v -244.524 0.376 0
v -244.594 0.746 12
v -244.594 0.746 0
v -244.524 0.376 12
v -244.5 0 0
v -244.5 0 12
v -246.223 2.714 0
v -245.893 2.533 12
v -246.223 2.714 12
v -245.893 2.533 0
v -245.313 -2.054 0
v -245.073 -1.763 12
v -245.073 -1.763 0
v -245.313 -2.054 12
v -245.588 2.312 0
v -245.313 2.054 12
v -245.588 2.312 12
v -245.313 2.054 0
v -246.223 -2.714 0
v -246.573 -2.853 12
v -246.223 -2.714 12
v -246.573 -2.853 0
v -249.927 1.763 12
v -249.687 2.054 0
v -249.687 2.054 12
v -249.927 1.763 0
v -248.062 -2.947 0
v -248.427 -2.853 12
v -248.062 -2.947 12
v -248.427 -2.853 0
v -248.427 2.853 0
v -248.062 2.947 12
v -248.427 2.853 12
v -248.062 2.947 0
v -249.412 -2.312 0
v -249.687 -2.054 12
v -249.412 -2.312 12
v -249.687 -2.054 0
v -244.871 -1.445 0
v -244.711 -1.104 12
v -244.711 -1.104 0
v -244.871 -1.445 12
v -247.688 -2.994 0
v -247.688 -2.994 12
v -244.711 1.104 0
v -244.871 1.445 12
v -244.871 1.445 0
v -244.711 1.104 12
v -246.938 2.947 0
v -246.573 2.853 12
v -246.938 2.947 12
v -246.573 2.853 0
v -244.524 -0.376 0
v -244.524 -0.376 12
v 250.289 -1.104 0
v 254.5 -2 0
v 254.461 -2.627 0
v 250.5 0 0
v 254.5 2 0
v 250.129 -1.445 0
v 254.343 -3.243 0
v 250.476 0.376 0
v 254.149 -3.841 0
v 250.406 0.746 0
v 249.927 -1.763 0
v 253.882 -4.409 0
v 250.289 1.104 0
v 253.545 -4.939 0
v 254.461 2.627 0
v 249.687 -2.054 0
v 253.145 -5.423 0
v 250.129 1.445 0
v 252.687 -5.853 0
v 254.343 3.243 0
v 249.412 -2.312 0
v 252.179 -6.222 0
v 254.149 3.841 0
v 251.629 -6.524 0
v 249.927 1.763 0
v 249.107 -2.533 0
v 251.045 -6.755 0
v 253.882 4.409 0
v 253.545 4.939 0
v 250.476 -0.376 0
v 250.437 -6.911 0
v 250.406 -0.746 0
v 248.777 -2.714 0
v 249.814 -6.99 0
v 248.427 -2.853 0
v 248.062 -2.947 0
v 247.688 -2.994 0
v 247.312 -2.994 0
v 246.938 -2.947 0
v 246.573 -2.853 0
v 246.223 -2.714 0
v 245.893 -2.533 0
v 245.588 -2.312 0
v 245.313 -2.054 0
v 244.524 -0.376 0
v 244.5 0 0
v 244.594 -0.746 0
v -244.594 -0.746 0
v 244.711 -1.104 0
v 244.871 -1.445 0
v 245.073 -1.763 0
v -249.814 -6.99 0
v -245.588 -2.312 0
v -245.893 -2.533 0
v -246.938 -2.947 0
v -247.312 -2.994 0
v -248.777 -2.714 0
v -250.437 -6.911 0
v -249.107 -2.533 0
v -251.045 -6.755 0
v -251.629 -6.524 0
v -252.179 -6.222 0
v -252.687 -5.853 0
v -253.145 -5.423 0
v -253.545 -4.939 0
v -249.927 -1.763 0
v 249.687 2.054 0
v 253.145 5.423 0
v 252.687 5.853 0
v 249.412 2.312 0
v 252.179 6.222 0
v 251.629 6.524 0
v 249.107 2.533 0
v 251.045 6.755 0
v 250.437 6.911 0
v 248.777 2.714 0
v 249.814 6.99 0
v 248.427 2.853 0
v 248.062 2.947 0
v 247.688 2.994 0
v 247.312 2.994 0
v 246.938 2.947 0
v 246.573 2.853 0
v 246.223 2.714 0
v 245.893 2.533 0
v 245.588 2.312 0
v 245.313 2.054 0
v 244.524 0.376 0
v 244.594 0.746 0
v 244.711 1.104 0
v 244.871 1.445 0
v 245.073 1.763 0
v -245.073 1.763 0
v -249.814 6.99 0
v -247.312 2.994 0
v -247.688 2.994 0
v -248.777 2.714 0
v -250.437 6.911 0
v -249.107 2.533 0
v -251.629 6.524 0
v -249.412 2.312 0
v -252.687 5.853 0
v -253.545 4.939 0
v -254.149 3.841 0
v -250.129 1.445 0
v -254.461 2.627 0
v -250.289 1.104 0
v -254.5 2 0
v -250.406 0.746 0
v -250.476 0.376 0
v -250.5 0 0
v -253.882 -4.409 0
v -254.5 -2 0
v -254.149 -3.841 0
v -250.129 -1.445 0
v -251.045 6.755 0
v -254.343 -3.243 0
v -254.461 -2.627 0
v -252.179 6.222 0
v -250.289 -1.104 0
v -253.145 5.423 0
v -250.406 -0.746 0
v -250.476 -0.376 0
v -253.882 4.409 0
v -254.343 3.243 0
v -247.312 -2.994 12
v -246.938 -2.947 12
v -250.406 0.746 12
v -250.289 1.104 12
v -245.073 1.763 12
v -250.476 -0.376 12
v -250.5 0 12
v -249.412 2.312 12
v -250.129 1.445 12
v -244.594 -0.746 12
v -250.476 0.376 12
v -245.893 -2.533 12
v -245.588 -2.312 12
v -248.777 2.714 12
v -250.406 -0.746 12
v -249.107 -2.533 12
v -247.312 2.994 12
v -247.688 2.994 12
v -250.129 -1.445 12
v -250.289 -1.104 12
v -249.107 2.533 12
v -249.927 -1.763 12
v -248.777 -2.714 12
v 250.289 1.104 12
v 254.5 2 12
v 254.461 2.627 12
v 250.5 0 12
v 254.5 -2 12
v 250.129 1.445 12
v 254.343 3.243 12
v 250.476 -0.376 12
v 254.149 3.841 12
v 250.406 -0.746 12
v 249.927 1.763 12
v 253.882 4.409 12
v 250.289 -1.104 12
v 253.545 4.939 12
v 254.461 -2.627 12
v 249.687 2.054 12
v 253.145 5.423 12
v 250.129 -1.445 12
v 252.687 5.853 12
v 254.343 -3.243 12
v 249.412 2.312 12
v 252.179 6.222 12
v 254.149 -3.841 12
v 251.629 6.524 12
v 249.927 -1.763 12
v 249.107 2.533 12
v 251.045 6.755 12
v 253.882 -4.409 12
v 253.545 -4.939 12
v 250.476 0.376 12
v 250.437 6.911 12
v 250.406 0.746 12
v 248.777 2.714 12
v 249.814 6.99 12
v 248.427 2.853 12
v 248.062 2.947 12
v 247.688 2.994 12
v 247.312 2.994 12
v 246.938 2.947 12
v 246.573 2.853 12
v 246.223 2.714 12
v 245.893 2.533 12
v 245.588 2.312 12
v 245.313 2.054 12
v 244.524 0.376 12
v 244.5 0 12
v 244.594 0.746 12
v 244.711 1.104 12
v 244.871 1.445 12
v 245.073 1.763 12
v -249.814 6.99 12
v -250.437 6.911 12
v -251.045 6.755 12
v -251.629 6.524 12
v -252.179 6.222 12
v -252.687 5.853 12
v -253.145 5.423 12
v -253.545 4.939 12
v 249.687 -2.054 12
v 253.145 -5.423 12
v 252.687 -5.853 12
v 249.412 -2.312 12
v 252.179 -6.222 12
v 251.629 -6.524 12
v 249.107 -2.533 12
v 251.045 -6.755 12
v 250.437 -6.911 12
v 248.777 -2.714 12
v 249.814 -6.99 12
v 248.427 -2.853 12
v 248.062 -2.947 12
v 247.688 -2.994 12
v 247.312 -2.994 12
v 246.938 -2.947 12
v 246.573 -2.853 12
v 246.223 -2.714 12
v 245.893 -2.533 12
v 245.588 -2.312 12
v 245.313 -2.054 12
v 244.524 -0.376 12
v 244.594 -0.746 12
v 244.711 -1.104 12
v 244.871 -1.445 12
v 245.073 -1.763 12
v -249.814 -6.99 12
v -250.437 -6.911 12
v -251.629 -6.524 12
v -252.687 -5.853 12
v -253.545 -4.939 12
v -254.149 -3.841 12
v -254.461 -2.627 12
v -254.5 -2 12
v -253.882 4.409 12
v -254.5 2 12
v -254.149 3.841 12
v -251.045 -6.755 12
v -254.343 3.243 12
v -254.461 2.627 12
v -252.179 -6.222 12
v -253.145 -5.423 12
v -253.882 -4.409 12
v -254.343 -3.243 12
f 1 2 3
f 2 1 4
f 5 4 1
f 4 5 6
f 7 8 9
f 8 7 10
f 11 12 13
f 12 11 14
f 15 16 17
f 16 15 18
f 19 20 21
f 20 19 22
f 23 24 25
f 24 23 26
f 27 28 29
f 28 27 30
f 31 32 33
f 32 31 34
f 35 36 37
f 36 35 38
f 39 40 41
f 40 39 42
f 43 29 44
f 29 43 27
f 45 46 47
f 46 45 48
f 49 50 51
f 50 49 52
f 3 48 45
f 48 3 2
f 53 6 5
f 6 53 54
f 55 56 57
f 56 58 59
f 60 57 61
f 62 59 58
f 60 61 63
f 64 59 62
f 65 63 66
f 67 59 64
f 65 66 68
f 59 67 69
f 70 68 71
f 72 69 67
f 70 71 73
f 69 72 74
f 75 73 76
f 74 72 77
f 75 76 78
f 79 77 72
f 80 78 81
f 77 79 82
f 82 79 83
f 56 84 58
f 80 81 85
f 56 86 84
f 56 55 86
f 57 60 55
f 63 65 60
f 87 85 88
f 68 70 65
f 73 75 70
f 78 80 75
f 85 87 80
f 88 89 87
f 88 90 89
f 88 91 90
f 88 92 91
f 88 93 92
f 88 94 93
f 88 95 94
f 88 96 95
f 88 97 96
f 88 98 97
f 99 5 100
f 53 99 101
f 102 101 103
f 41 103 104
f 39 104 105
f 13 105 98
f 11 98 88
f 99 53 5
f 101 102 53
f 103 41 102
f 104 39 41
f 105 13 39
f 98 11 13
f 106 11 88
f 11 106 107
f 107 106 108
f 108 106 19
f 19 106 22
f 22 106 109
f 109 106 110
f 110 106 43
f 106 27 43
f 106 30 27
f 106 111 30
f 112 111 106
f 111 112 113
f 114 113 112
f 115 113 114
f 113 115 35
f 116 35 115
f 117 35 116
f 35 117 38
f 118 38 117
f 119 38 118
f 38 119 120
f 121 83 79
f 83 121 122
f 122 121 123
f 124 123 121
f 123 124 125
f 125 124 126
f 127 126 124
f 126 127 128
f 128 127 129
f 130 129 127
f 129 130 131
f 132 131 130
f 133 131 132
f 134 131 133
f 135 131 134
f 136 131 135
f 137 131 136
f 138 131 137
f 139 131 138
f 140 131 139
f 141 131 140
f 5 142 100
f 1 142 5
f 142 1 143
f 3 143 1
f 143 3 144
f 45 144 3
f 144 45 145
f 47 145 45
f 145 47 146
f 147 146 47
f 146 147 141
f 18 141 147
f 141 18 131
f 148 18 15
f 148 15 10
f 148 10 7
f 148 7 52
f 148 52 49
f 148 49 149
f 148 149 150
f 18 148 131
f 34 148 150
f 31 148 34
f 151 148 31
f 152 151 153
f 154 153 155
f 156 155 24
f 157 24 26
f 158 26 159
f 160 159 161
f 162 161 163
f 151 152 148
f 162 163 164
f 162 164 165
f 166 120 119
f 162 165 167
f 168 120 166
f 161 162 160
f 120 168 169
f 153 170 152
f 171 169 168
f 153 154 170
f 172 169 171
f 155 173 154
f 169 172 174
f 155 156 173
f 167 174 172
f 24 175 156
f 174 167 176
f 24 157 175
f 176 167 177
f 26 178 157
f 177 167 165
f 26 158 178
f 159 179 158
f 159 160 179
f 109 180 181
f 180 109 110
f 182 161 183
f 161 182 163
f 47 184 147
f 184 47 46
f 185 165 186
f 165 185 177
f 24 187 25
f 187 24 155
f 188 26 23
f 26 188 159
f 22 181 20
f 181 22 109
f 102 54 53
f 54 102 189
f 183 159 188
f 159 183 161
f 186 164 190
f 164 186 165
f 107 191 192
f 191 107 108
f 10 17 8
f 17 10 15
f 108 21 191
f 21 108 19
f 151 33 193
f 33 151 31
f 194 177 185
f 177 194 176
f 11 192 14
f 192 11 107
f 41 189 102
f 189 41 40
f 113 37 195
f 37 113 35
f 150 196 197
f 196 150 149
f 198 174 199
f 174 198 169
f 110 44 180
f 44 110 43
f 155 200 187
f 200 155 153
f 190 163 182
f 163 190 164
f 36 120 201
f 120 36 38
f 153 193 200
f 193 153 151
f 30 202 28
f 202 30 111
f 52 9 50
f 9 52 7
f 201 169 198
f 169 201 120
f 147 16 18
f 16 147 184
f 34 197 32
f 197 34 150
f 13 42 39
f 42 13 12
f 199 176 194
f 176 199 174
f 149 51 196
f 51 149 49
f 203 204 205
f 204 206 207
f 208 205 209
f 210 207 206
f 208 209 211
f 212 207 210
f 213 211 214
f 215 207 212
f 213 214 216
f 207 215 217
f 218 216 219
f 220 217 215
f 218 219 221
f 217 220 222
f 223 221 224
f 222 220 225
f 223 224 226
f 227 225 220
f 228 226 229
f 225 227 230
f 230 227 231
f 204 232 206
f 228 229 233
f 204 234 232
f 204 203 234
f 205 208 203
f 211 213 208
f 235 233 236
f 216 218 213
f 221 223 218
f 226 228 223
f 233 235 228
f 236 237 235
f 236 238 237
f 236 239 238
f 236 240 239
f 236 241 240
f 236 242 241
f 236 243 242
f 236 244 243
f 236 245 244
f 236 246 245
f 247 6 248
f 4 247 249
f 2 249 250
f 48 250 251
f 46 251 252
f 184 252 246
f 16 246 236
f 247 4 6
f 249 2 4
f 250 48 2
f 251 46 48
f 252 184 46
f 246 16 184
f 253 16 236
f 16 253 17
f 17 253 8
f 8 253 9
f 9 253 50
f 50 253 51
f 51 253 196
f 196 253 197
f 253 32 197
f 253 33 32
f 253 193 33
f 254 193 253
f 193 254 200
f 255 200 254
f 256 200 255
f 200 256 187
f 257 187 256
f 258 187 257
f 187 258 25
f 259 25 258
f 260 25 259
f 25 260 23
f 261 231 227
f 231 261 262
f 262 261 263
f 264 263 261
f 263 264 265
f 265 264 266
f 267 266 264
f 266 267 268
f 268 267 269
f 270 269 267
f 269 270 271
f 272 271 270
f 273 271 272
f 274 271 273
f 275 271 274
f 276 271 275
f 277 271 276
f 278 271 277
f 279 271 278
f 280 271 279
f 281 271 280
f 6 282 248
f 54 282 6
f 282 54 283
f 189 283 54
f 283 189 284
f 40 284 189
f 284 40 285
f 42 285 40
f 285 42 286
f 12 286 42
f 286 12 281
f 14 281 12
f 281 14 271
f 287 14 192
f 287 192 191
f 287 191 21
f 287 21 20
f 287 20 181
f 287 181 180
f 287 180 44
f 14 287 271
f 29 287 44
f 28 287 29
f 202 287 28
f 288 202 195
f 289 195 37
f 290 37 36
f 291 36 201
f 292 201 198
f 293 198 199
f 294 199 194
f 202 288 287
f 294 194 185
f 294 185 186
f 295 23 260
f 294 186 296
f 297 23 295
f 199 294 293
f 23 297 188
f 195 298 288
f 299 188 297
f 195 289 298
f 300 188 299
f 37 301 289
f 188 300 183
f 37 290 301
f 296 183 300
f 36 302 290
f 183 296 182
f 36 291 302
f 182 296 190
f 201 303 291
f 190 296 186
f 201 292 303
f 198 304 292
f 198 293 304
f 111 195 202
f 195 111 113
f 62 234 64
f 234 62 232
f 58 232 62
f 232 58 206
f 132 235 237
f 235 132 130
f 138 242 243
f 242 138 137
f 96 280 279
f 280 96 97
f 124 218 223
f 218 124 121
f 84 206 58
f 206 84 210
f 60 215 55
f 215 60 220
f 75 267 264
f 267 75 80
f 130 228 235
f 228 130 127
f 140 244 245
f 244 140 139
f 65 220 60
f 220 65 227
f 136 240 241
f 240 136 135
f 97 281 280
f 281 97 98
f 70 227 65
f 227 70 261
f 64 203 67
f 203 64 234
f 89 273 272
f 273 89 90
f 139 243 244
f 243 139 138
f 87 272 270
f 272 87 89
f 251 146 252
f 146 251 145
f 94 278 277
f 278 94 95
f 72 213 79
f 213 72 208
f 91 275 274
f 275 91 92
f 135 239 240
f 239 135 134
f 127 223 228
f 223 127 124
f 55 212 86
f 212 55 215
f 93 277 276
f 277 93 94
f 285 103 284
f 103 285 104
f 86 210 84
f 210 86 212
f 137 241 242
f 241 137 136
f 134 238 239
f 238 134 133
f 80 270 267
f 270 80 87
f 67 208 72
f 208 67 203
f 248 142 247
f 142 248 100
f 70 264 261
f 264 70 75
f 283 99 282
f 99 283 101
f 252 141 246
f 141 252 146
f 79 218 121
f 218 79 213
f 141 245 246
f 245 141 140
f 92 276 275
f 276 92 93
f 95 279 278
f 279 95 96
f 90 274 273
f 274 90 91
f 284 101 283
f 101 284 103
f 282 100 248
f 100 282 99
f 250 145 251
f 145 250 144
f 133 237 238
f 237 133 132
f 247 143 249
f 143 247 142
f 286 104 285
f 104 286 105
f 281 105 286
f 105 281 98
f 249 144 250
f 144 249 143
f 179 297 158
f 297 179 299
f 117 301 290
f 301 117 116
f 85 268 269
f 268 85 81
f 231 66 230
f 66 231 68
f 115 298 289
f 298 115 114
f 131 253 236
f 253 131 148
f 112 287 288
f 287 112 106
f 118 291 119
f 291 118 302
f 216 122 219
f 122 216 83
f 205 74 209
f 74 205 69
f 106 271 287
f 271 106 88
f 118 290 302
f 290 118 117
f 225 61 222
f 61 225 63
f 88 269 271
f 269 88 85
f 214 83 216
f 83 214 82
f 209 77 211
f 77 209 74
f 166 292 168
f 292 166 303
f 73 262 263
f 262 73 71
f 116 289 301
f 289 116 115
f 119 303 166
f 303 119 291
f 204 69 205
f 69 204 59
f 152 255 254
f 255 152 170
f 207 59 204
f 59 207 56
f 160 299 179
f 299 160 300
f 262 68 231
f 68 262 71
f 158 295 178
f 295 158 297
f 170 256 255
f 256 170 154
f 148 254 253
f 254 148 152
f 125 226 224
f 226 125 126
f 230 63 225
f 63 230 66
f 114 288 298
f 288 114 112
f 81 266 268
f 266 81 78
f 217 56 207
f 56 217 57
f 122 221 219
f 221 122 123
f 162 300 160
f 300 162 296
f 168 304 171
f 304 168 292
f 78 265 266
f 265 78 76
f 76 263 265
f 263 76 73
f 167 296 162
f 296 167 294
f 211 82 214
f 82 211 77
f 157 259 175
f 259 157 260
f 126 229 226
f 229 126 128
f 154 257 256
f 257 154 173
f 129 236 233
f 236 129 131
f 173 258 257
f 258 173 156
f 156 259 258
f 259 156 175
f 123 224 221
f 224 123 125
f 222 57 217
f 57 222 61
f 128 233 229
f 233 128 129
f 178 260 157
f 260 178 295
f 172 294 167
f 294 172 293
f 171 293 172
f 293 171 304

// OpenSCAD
$fn = 50;


difference() {
	union() {
		hull() {
			translate(v = [-249.5000000000, 2.0000000000, 0]) {
				cylinder(h = 12, r = 5);
			}
			translate(v = [249.5000000000, 2.0000000000, 0]) {
				cylinder(h = 12, r = 5);
			}
			translate(v = [-249.5000000000, -2.0000000000, 0]) {
				cylinder(h = 12, r = 5);
			}
			translate(v = [249.5000000000, -2.0000000000, 0]) {
				cylinder(h = 12, r = 5);
			}
		}
	}
	union() {
		translate(v = [-247.5000000000, 0.0000000000, 0]) {
			cylinder(h = 12, r = 3.0000000000);
		}
		translate(v = [247.5000000000, 0.0000000000, 0]) {
			cylinder(h = 12, r = 3.0000000000);
		}
		translate(v = [-247.5000000000, 0.0000000000, 0]) {
			cylinder(h = 12, r = 1.5000000000);
		}
		translate(v = [247.5000000000, 0.0000000000, 0]) {
			cylinder(h = 12, r = 1.5000000000);
		}
		translate(v = [-247.5000000000, 0.0000000000, 0]) {
			cylinder(h = 12, r = 1.5000000000);
		}
		translate(v = [247.5000000000, 0.0000000000, 0]) {
			cylinder(h = 12, r = 1.5000000000);
		}
		translate(v = [-247.5000000000, 0.0000000000, 0]) {
			cylinder(h = 12, r = 1.5000000000);
		}
		translate(v = [247.5000000000, 0.0000000000, 0]) {
			cylinder(h = 12, r = 1.5000000000);
		}
	}
}
